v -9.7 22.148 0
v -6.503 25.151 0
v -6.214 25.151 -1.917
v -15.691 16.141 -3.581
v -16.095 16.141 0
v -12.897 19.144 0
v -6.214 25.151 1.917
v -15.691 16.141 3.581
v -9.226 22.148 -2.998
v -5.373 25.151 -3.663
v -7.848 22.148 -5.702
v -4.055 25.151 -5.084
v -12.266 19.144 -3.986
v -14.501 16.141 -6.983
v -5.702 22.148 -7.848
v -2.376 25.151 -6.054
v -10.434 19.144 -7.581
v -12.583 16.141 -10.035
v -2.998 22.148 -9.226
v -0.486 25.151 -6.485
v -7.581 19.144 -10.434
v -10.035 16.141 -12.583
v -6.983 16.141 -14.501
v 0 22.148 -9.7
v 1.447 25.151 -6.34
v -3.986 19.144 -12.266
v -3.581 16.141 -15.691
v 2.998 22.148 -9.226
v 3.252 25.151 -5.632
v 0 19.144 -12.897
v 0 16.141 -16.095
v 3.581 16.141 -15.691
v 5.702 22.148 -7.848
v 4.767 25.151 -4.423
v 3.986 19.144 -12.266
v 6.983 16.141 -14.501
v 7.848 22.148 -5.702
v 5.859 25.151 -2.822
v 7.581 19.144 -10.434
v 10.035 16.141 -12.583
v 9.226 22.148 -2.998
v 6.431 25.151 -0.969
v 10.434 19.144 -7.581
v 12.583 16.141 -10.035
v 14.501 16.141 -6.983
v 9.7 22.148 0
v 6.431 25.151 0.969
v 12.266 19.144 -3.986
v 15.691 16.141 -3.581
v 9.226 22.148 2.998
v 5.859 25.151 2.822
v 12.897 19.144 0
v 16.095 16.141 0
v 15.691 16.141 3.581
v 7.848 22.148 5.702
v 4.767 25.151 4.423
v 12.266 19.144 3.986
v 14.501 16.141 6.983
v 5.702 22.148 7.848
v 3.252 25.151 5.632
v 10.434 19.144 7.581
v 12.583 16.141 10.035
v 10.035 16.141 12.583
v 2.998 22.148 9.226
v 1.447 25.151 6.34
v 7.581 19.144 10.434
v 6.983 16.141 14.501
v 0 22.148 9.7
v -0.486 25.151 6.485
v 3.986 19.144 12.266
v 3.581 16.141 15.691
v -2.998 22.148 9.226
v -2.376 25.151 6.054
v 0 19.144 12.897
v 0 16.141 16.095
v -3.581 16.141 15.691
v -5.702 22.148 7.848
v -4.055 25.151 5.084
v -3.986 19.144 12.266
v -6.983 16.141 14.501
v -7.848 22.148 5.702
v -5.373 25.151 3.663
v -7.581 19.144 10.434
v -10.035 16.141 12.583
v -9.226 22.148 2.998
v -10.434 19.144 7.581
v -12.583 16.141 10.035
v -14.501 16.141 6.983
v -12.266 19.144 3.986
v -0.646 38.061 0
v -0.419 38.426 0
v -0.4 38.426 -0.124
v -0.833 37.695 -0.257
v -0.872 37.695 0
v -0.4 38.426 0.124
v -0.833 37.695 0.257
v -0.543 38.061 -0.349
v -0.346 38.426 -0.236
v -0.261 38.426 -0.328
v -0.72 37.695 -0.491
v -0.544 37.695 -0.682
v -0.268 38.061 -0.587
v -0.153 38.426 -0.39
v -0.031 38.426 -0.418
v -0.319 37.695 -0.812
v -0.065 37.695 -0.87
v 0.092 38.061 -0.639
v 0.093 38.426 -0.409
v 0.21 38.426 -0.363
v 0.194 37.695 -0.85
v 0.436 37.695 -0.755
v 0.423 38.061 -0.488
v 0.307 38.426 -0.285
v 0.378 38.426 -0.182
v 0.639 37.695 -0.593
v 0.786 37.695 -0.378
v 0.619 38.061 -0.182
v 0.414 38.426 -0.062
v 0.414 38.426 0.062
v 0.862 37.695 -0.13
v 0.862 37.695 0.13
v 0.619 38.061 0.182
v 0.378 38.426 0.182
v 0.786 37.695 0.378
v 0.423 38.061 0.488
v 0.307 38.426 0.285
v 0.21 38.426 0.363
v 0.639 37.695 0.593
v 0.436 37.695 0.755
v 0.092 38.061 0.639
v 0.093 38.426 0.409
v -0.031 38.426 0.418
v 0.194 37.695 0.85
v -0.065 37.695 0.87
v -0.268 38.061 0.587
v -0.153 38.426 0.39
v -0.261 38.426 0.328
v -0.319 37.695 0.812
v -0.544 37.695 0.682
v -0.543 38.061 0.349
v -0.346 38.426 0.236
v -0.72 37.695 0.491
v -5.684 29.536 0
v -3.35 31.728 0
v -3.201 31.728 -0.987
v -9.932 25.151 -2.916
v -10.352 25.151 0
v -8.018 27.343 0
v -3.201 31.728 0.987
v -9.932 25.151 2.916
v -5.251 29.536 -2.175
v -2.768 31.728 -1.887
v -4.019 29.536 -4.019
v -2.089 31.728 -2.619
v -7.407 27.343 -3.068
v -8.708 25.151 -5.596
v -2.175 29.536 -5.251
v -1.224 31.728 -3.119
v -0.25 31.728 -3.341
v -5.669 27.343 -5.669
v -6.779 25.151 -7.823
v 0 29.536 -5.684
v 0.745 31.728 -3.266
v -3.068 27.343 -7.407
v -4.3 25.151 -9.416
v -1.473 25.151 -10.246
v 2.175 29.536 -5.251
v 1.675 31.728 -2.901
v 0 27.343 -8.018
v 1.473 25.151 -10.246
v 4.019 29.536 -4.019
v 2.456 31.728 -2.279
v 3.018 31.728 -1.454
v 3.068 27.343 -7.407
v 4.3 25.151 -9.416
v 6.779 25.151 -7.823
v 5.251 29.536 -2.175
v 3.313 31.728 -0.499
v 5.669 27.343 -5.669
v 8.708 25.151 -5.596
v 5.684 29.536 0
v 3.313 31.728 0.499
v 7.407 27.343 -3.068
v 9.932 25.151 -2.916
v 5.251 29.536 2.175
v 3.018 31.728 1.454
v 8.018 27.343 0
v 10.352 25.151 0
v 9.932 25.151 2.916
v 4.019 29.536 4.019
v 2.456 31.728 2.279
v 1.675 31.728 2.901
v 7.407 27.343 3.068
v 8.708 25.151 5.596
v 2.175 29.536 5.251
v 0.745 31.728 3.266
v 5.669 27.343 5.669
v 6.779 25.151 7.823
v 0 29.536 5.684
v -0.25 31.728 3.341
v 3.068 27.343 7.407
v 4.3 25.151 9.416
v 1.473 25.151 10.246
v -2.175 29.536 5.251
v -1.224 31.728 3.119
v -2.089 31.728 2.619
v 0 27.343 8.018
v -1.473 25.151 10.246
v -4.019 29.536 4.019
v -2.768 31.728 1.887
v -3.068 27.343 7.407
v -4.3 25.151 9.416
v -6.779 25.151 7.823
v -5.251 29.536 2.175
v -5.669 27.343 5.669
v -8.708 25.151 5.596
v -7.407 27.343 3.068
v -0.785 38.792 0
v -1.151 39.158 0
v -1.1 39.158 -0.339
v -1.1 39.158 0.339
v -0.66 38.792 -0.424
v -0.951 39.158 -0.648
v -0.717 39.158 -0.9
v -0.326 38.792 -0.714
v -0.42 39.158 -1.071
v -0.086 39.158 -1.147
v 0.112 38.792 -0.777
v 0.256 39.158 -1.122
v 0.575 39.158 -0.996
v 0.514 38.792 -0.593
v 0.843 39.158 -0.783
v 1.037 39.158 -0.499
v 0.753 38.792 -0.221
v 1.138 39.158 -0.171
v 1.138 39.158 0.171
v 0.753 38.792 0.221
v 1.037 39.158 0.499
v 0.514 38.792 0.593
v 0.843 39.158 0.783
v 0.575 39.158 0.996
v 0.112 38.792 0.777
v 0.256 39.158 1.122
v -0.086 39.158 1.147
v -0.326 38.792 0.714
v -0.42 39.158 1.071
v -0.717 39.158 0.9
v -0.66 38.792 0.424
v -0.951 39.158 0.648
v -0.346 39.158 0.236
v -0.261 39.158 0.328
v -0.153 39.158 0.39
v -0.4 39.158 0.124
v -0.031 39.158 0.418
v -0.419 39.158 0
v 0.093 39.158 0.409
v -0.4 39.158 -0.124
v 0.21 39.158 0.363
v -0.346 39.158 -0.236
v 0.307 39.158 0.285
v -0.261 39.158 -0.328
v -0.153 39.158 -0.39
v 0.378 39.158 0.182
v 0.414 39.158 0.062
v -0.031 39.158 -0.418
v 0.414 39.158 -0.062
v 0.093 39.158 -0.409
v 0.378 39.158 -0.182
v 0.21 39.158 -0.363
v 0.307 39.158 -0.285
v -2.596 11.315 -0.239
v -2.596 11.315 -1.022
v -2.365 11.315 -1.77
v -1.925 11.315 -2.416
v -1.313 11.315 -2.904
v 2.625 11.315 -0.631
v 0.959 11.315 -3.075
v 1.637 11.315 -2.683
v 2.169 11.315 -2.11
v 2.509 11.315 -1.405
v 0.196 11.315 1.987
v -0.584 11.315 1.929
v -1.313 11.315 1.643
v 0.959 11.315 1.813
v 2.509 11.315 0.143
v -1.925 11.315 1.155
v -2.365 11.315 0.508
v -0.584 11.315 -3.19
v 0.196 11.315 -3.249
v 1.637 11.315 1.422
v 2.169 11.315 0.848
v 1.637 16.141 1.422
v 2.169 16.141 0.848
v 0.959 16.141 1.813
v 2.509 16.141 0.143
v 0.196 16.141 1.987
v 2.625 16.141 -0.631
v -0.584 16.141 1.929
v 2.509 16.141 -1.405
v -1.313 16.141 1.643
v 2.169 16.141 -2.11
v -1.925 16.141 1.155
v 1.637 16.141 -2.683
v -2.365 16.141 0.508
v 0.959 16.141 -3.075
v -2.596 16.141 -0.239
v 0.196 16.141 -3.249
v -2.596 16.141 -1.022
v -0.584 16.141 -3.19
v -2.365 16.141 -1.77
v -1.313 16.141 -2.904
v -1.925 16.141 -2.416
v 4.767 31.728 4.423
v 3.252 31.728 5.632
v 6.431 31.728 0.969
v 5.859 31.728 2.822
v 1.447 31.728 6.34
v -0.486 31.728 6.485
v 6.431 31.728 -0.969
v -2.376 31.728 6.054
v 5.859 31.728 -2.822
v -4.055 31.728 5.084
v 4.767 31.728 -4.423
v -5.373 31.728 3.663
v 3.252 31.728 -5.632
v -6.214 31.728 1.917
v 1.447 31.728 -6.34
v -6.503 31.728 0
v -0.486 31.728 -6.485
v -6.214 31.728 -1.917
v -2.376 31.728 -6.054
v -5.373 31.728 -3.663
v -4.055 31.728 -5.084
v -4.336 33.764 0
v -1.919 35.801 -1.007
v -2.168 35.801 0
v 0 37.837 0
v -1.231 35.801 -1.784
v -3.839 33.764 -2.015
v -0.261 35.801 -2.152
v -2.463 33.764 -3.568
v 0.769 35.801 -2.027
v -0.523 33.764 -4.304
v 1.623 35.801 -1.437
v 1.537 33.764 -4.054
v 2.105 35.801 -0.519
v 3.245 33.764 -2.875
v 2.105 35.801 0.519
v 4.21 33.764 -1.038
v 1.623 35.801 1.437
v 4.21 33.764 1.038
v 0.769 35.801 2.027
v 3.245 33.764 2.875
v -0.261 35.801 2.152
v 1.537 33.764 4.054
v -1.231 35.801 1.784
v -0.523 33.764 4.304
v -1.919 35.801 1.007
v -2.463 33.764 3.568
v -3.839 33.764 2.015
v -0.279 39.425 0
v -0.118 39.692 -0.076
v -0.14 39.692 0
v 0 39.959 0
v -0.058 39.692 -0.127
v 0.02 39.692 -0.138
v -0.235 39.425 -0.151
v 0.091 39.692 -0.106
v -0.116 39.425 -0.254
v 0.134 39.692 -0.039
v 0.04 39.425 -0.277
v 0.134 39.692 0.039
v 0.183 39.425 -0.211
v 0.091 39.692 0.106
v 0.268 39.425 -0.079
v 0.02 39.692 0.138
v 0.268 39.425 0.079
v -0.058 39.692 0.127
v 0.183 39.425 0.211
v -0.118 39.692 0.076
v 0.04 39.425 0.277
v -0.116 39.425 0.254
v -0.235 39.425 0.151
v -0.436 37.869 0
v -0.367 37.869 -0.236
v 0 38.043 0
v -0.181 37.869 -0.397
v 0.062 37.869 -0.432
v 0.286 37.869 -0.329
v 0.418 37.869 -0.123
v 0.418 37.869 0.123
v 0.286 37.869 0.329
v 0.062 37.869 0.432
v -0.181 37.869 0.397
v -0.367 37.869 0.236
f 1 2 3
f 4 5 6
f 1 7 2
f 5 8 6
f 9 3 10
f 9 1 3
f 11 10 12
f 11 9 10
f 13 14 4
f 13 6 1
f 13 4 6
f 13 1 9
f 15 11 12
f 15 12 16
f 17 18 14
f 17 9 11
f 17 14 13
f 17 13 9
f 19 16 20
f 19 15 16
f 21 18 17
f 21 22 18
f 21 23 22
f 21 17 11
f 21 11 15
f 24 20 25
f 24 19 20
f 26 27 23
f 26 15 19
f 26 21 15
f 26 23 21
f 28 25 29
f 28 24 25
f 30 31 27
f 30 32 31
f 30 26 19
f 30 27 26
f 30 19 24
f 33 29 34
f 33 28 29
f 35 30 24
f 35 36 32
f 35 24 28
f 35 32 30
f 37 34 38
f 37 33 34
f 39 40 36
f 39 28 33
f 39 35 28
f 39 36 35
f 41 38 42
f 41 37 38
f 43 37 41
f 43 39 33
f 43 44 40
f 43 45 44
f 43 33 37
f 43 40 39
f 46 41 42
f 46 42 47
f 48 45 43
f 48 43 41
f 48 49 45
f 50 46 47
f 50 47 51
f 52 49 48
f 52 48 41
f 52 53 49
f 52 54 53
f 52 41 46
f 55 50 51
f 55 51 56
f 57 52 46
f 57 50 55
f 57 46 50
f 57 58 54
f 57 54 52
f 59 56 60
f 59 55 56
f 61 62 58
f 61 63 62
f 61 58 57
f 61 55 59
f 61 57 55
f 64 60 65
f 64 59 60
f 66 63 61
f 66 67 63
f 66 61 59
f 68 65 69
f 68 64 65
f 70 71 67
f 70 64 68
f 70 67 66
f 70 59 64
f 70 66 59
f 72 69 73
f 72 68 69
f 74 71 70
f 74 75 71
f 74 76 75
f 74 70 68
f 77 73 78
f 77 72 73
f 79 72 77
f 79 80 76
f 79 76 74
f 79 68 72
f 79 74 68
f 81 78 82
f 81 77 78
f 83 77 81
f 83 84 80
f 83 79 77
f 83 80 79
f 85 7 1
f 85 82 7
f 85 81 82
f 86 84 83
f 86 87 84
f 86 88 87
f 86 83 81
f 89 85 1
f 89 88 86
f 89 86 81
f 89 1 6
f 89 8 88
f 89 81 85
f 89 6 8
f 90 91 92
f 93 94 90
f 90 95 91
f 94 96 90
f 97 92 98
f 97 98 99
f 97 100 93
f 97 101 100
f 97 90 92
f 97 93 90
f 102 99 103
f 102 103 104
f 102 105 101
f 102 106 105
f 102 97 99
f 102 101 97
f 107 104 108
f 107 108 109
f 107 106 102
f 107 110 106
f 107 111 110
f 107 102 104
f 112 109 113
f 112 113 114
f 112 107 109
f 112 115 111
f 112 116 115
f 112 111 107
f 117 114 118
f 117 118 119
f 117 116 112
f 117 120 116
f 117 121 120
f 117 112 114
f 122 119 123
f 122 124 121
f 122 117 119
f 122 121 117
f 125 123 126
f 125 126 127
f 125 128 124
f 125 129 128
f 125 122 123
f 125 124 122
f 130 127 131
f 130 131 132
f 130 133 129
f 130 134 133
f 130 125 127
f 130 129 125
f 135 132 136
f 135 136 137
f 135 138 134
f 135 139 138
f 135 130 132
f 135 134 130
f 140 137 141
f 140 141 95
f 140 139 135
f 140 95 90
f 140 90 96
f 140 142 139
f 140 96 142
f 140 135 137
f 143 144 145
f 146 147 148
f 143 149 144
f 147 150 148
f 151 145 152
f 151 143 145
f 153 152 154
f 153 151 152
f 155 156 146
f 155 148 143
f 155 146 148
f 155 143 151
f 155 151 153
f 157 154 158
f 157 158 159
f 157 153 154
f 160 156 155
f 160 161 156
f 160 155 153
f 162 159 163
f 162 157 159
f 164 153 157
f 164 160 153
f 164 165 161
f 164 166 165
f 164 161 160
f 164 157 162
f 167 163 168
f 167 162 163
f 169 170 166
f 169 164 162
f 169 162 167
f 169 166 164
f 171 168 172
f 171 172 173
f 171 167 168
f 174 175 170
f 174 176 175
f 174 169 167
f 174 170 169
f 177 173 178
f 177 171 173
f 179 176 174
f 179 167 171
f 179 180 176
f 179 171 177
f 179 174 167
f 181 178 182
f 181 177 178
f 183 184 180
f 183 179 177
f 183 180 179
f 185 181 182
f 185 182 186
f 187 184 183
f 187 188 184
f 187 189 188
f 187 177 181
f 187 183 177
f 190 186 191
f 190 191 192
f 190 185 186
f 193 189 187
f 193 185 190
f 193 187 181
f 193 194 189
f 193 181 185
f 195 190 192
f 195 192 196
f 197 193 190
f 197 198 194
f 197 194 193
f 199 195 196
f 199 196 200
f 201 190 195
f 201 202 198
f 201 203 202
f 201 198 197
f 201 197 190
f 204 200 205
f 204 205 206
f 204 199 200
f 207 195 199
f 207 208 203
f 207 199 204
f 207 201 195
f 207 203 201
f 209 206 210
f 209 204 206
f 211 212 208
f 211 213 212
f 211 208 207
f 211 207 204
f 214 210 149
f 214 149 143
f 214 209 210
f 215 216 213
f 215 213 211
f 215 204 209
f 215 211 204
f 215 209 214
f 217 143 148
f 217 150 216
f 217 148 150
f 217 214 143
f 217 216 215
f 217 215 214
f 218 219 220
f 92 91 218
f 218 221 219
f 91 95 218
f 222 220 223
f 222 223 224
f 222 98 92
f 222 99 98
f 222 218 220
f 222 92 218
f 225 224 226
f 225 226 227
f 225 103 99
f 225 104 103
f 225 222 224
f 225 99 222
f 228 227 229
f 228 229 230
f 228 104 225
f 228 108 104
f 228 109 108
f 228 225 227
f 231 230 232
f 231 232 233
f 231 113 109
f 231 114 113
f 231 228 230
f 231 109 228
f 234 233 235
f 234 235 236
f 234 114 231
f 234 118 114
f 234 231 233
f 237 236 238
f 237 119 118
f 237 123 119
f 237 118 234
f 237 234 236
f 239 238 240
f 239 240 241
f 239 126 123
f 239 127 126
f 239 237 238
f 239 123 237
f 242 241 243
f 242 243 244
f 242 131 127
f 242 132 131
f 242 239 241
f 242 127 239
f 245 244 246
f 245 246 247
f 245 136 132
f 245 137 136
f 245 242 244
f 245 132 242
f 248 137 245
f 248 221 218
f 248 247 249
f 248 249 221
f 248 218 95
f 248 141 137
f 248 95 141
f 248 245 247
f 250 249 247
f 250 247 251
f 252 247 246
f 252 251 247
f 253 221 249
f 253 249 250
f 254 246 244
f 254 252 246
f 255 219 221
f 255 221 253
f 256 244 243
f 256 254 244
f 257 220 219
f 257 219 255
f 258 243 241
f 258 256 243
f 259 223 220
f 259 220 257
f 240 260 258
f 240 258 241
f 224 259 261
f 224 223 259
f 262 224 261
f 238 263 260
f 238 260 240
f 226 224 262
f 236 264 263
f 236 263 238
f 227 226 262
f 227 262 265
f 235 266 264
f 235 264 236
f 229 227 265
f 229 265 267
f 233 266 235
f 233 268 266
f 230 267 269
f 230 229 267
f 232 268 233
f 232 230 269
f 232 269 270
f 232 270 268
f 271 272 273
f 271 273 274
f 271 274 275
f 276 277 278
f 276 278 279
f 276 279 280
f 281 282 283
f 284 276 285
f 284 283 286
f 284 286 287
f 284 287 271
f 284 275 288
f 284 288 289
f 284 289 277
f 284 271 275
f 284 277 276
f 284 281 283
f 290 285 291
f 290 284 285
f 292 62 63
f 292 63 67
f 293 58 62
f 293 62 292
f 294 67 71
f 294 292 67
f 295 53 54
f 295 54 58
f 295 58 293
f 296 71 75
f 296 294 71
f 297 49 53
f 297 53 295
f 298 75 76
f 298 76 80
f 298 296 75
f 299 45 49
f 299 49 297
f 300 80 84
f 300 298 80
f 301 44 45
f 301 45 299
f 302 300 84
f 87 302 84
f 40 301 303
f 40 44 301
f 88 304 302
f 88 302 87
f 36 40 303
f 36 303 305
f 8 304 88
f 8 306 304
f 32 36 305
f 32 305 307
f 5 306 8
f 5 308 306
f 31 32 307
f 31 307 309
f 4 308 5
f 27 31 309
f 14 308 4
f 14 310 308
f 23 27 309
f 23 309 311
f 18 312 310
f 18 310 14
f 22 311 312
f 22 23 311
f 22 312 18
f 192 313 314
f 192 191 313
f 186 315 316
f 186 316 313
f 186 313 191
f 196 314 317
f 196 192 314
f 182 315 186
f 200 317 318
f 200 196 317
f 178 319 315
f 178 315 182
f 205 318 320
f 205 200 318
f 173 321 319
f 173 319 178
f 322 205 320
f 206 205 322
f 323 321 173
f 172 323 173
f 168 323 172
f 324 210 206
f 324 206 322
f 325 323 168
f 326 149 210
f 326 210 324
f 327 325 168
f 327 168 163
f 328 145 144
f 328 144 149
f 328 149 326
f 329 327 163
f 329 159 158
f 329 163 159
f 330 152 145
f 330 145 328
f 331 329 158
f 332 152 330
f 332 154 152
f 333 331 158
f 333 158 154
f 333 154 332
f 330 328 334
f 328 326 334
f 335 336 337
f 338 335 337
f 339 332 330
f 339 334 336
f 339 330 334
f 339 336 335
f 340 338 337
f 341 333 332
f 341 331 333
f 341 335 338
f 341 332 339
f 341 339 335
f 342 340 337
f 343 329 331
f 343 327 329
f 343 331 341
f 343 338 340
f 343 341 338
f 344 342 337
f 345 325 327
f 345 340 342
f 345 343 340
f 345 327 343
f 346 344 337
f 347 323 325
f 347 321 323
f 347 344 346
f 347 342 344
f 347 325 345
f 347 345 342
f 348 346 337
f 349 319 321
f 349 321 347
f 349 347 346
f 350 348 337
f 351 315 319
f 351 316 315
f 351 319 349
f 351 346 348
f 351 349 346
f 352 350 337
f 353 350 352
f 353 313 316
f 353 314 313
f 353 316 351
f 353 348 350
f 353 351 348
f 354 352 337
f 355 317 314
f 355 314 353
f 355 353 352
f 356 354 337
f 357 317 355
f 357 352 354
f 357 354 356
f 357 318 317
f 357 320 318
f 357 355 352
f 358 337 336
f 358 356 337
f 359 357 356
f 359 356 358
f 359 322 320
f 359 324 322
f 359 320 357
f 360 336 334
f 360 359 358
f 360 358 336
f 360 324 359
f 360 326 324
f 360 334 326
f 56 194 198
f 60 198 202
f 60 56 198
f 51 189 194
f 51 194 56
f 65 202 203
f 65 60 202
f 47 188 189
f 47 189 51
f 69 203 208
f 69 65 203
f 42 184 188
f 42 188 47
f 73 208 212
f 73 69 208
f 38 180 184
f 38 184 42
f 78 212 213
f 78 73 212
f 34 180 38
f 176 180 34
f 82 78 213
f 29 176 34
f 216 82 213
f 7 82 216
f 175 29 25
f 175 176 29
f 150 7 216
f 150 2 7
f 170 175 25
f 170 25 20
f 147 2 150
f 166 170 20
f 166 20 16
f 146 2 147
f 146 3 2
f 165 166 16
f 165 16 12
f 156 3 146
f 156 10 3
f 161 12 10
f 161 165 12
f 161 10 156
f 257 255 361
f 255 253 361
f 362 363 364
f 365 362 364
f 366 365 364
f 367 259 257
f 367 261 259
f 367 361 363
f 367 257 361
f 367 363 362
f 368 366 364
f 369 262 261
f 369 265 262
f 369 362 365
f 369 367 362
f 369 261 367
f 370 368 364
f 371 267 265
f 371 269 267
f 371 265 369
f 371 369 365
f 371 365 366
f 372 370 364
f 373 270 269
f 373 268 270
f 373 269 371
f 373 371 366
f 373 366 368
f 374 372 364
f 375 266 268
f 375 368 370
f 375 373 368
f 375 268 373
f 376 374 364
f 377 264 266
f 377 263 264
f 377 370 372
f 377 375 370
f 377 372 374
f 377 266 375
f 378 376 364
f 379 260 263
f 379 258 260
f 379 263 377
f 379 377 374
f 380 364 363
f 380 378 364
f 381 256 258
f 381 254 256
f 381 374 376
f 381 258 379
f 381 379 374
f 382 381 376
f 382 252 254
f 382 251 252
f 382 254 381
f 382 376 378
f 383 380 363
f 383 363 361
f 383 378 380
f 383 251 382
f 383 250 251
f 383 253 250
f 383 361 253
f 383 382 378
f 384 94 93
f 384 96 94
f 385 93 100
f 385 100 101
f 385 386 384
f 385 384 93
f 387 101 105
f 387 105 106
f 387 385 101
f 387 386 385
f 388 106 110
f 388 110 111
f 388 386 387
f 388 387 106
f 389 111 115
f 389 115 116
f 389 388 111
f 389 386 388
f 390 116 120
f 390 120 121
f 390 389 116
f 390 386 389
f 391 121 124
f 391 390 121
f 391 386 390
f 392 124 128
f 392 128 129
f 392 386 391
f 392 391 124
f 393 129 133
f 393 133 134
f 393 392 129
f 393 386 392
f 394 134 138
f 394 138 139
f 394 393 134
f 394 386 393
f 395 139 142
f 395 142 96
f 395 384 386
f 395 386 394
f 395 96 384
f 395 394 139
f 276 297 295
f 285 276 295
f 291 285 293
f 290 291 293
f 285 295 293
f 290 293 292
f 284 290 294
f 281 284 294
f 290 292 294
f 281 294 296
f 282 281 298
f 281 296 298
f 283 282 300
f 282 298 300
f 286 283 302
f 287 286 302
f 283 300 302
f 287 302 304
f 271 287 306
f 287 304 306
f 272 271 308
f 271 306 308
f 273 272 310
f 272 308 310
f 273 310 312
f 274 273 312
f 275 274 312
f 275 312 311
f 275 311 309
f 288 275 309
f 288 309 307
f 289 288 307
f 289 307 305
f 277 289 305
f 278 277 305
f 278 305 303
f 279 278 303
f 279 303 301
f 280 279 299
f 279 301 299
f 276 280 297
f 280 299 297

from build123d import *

# Parameters (mm, degrees)
F2_R     = 2.625405
F3_DEPTH = 4.826


with BuildPart() as f1:
    # F0 (on Top) → F1 (revolve)
    with BuildSketch(Plane.XY):
        Polygon((0, 16.141157), (0, 37.837241), (-6.503277, 31.728104), (-3.350172, 31.728104), (-10.351505, 25.151096), (-6.503277, 25.151096), (-16.094504, 16.141157), align=None)
    revolve(axis=Axis((0, 26.989199, 0), (0, -1, 0)))

    # F2 (on face) → F3 (join)
    with BuildSketch(Plane.XZ.offset(-16.141157)):
        with Locations((0, -0.630745)):
            Circle(F2_R)
    extrude(amount=F3_DEPTH)


with BuildPart() as f5:
    # F4 (on Top) → F5 (revolve)
    with BuildSketch(Plane.XY):
        Polygon((0, 38.04319), (0, 39.959233), (-0.419072, 39.157979), (-1.150653, 39.157979), (-0.419072, 38.426399), (-0.871955, 37.694816), align=None)
    revolve(axis=Axis((0, 39.001212, 0), (0, -1, 0)))


solid = Compound([f1.part, f5.part])
